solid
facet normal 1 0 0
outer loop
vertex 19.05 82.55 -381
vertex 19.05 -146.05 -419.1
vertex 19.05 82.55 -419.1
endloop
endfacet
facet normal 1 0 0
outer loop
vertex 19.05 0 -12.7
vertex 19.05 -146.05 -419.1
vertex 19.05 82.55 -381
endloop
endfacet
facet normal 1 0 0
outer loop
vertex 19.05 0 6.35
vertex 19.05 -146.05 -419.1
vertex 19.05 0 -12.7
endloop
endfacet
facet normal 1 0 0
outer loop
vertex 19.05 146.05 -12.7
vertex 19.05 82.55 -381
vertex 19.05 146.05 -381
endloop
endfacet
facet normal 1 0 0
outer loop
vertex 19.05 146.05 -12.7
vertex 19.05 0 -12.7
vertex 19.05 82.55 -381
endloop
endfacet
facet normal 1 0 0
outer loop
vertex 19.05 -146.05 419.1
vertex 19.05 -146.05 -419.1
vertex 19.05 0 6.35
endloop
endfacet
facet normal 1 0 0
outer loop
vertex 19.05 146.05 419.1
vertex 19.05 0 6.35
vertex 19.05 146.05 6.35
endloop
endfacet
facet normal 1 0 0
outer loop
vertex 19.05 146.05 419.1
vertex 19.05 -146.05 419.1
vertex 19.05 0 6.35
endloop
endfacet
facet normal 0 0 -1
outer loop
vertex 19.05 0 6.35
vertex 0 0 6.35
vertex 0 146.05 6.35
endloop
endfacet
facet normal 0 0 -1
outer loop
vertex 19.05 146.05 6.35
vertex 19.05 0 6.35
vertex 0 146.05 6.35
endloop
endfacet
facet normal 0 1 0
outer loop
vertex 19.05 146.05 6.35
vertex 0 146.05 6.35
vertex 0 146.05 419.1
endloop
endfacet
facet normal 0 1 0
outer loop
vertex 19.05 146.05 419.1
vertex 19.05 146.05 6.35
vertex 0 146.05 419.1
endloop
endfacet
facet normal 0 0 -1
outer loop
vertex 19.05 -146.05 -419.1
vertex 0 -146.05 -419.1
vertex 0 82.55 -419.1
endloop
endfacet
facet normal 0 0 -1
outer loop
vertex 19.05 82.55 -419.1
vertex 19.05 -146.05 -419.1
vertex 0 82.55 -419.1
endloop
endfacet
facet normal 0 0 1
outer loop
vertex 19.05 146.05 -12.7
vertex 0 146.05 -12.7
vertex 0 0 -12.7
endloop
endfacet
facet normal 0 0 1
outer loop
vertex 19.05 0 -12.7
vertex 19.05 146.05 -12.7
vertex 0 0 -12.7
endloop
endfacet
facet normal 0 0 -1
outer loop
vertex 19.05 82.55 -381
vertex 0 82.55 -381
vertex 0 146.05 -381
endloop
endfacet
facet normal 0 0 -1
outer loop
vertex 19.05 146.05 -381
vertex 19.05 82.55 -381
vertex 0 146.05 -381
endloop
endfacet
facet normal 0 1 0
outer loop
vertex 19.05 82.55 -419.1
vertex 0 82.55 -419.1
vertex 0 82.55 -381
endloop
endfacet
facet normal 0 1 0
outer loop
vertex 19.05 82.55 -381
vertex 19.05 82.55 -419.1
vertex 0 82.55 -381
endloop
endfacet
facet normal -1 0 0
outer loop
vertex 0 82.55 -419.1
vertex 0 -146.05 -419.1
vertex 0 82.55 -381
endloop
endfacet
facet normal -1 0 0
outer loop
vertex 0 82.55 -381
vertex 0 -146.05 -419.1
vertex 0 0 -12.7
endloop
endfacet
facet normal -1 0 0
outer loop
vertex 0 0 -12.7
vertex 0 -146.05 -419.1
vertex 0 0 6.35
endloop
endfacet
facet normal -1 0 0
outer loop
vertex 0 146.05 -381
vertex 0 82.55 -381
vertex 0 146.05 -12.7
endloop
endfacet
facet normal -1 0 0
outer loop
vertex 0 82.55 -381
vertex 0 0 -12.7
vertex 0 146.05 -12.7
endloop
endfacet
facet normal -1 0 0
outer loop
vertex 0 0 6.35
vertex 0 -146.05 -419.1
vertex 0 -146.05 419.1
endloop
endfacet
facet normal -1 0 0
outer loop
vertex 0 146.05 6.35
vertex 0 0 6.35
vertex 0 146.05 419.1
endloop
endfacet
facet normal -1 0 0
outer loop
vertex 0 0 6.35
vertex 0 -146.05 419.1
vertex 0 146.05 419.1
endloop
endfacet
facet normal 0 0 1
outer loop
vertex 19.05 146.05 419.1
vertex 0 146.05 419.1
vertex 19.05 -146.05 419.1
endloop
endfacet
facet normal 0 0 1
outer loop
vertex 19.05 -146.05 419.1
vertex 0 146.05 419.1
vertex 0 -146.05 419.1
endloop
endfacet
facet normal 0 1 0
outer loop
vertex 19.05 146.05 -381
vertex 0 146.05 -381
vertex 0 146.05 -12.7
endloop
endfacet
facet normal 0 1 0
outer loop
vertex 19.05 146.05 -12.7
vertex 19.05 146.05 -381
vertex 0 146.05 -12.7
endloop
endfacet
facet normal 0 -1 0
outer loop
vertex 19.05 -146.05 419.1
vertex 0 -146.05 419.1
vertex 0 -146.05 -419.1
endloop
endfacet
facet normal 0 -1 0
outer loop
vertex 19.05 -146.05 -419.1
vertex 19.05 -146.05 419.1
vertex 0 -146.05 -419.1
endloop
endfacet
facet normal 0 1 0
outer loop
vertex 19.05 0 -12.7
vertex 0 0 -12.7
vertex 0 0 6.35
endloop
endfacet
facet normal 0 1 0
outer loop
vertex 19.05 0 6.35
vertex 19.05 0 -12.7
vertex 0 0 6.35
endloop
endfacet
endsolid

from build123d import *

# Parameters (mm, degrees)
F0_W     = 146.05
F0_H     = 412.75
F0_H_2   = 406.4
F0_H_3   = 19.05
F1_DEPTH = 19.05


with BuildPart() as f1:
    # F0 (on Right) → F1 (new body)
    with BuildSketch(Plane.YZ):
        with Locations((-73.025, 212.725)):
            Rectangle(F0_W, F0_H)
        with Locations((73.025, 212.725)):
            Rectangle(F0_W, F0_H)
        Polygon((146.05, -12.7), (0, -12.7), (0, -419.1), (82.55, -419.1), (82.55, -381), (146.05, -381), align=None)
        with Locations((-73.025, -215.9)):
            Rectangle(F0_W, F0_H_2)
        with Locations((-73.025, -3.175)):
            Rectangle(F0_W, F0_H_3)
    extrude(amount=F1_DEPTH)


solid = f1.part
